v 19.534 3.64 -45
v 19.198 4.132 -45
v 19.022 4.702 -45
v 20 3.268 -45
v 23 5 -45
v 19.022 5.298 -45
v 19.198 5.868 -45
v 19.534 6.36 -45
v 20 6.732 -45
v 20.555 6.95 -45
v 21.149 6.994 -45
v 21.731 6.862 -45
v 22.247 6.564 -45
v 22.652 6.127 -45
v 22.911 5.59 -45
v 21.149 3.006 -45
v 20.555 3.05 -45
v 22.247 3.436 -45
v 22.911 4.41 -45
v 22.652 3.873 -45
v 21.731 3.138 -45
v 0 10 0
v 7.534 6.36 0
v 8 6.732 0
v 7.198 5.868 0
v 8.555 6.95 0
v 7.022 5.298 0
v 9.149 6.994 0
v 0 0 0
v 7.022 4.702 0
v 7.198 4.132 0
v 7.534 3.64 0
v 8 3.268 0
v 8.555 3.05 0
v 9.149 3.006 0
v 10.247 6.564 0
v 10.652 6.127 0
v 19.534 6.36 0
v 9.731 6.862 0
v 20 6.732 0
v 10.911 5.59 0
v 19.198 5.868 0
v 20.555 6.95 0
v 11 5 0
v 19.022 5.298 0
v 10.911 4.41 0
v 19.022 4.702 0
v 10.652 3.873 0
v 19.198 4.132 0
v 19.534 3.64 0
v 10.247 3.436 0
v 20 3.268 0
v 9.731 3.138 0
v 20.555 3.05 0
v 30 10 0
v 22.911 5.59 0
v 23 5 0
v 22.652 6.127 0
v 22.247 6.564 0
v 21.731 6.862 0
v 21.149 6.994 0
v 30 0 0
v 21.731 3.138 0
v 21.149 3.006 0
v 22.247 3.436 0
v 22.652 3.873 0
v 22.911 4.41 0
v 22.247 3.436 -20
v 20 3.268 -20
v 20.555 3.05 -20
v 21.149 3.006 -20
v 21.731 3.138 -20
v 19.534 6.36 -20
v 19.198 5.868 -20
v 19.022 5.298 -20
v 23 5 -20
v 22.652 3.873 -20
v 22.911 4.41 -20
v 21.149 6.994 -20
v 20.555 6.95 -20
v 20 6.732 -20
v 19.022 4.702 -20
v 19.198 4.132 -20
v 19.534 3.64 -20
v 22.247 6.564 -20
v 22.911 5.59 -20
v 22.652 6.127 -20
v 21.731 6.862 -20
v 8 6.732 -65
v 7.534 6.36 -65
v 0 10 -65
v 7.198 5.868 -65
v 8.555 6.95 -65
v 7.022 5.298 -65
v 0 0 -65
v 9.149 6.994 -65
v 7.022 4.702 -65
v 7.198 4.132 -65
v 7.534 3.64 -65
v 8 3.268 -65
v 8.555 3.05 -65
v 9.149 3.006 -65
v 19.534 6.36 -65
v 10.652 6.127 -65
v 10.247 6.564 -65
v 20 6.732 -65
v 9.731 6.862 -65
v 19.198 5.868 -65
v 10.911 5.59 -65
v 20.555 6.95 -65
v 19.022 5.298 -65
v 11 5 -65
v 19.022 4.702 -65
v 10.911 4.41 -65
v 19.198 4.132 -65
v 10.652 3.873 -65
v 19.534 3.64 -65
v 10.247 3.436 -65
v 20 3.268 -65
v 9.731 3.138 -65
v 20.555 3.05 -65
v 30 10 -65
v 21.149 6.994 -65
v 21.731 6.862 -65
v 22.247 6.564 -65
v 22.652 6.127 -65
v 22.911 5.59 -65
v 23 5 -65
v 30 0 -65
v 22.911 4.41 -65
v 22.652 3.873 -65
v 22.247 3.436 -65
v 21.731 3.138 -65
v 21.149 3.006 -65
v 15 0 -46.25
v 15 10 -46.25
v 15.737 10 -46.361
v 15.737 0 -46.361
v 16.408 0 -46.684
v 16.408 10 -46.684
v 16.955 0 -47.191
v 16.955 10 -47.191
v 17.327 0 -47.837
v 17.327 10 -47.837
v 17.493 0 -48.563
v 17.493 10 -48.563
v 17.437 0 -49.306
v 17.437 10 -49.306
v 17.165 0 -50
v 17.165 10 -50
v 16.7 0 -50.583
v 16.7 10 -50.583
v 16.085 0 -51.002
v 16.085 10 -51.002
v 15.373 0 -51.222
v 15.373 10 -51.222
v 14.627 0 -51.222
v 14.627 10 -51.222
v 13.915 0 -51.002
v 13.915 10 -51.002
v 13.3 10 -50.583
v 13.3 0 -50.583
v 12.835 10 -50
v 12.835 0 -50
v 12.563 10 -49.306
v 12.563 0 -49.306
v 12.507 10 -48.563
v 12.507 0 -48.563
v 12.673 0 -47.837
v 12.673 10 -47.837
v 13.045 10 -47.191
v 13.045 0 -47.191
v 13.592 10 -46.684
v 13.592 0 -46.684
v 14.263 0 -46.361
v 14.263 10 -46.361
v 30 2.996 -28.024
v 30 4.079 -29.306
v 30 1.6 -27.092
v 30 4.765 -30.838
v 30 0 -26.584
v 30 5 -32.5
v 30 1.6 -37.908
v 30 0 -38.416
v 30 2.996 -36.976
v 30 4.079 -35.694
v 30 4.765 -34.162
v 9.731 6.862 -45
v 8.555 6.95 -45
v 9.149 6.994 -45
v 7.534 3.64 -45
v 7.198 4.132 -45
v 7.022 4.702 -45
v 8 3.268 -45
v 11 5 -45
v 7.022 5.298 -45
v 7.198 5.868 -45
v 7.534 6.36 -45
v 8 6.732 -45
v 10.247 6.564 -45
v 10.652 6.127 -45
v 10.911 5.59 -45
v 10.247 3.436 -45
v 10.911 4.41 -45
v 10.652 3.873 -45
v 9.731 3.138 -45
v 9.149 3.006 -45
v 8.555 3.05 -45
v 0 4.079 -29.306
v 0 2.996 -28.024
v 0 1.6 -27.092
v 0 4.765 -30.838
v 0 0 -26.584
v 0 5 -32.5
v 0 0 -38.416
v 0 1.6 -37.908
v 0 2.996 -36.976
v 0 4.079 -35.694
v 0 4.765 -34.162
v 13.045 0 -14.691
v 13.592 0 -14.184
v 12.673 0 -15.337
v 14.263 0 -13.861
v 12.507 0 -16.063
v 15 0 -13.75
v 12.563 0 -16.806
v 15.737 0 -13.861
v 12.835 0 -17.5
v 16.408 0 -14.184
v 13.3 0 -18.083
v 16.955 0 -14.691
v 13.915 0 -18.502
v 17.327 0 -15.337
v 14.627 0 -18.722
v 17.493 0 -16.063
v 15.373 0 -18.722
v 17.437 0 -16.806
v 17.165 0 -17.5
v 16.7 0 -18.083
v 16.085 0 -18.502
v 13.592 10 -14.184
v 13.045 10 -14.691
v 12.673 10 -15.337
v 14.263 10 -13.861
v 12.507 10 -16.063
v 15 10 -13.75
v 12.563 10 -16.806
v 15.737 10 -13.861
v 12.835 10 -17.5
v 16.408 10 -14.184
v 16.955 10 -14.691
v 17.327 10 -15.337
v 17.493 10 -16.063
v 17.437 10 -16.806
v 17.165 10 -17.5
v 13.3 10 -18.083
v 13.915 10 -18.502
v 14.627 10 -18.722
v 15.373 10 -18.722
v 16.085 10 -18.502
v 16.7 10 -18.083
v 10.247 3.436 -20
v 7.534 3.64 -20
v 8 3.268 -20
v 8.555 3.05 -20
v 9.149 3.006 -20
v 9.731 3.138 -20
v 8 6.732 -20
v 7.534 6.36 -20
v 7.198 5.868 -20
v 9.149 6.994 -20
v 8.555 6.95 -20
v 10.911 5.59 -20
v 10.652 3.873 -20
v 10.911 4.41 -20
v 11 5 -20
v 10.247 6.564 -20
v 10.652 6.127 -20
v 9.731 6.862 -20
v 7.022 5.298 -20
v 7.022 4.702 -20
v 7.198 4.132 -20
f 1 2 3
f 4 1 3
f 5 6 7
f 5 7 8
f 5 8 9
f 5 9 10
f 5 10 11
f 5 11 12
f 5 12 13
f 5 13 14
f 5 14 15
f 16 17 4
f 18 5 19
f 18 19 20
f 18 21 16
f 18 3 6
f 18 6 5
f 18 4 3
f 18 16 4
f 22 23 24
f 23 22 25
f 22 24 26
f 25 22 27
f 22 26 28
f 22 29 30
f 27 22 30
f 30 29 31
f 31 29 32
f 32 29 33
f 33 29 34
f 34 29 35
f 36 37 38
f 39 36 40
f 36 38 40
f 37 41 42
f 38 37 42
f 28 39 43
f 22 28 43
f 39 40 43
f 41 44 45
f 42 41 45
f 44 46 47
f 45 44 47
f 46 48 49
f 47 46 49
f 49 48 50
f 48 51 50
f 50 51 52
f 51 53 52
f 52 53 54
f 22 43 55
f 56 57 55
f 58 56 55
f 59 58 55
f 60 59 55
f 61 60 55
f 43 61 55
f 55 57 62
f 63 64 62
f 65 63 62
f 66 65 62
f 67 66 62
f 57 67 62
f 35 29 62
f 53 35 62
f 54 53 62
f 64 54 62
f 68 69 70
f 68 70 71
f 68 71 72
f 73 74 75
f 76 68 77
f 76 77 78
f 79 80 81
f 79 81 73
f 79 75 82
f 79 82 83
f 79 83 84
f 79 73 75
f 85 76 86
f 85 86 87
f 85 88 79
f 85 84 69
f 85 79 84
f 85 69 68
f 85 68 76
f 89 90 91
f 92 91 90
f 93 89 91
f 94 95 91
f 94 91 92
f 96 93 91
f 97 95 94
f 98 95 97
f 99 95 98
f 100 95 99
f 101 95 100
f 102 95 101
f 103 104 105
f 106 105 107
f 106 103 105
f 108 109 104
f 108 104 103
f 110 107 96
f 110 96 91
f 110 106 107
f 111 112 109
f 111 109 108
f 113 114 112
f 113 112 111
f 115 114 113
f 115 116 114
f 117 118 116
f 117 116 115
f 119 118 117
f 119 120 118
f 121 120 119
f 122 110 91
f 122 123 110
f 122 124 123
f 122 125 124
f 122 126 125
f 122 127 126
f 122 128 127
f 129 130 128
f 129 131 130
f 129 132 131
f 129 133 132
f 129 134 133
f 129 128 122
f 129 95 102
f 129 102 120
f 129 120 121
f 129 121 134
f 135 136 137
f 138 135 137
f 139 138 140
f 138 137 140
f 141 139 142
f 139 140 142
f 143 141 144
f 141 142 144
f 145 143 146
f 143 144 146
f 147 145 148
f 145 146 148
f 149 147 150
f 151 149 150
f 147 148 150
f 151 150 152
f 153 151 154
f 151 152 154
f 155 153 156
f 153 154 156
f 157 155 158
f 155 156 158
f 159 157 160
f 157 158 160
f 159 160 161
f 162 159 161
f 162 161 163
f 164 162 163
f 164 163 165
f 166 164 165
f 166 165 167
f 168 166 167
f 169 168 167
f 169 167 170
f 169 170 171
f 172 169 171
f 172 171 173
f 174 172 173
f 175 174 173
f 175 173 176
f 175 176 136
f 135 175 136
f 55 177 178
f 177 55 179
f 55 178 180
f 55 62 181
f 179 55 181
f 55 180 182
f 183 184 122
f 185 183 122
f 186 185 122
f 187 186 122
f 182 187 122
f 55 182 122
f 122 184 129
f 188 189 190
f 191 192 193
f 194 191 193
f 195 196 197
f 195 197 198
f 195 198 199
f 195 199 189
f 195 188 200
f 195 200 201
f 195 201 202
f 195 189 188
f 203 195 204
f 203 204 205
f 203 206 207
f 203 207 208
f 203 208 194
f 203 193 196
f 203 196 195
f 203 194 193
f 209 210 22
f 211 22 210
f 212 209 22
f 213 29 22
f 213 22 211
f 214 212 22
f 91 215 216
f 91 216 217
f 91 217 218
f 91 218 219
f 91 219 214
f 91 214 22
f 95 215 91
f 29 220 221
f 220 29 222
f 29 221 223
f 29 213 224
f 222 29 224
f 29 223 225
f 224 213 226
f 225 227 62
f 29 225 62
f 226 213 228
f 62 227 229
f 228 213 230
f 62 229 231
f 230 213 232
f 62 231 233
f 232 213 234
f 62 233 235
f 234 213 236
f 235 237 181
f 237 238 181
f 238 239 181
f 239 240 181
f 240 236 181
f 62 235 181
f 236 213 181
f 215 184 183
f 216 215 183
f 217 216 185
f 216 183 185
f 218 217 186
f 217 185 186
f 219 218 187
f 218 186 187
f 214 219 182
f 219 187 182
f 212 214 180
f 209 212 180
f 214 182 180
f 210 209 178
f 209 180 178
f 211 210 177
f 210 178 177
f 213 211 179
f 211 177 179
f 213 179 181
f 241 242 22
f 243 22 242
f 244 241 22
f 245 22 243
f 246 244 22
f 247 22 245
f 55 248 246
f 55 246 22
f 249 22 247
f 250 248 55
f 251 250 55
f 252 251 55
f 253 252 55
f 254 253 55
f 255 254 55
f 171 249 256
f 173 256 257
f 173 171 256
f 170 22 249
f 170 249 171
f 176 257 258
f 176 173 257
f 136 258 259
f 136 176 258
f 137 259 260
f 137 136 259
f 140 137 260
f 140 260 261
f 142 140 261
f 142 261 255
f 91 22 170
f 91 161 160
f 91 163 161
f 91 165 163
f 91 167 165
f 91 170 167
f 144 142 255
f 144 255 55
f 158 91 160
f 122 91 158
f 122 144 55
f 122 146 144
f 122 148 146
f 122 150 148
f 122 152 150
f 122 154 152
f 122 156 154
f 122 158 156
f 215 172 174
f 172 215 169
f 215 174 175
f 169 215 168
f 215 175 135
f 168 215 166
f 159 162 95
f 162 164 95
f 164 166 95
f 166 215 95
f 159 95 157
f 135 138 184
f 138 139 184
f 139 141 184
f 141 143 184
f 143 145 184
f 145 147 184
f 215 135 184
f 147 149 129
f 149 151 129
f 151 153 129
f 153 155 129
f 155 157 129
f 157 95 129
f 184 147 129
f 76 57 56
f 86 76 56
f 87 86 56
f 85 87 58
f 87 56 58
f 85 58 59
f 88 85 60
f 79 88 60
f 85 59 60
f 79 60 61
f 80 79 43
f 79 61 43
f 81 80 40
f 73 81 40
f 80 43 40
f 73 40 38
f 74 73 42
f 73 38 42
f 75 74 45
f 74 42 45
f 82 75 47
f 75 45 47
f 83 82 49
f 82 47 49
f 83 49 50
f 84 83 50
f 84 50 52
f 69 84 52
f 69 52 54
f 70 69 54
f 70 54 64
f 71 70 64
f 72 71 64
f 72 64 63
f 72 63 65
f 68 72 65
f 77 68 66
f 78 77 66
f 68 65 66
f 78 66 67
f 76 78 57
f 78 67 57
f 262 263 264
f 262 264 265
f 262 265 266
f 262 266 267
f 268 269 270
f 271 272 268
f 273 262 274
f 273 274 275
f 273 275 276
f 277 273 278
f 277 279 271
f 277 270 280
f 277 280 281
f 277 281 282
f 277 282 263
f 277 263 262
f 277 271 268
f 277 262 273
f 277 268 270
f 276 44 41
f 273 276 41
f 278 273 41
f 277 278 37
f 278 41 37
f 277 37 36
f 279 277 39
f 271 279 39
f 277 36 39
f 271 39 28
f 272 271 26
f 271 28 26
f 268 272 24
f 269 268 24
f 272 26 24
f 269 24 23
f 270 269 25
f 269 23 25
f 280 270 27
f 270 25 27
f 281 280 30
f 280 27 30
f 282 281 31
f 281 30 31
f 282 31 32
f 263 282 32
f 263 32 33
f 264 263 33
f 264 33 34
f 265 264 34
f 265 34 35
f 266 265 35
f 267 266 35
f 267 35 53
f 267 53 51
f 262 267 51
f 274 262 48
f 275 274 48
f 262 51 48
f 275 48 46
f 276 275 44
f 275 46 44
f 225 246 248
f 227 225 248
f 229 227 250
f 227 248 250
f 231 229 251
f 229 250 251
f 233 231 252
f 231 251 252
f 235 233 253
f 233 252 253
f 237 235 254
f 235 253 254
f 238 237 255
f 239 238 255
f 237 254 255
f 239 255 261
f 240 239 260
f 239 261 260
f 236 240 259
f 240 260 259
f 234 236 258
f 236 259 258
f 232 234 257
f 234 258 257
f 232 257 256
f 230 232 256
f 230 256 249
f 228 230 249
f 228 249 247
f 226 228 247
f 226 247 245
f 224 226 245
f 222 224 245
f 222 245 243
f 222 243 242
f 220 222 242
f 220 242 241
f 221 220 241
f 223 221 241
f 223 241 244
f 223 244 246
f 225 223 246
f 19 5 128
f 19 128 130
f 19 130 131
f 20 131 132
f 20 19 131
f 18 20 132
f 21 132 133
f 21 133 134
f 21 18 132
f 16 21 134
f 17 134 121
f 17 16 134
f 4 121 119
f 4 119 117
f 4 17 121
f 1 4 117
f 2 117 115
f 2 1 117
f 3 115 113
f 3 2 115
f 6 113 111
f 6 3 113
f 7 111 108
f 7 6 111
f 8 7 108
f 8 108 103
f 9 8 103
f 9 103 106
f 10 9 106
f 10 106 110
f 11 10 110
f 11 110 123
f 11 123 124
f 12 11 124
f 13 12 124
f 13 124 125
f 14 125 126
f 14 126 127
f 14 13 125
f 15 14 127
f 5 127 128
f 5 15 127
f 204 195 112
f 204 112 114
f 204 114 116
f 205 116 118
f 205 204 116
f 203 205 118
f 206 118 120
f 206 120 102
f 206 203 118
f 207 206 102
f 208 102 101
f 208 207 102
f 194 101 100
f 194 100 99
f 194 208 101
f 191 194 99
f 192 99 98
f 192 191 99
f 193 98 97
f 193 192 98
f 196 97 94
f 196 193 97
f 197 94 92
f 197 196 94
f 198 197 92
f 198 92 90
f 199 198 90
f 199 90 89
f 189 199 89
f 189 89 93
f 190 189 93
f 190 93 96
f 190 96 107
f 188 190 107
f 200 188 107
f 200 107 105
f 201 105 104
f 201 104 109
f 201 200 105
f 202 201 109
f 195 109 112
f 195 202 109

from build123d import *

# Parameters (mm, degrees)
SKETCH_1_W            = 30
SKETCH_1_H            = 65
EXTRUDE_1_DEPTH       = 10
SKETCH_2_R            = 6
CUT_EXTRUDE_2_DEPTH   = 73.284161474
SKETCH_3_R            = 2.5
CUT_EXTRUDE_3_DEPTH   = 73.284161474
SKETCH_4_R            = 2
CUT_EXTRUDE_1_DEPTH   = 20
CUT_EXTRUDE_START     = -20
SKETCH_5_R            = 2
CUT_EXTRUDE_2_2_DEPTH = 20


with BuildPart() as part:
    # Эскиз1 → Вытянуть1 (new body)
    with BuildSketch(Plane(origin=(0, 0, 0), x_dir=(1, 0, 0), z_dir=(0, 1, 0))):
        with Locations((15, 32.5)):
            Rectangle(SKETCH_1_W, SKETCH_1_H)
    extrude(amount=EXTRUDE_1_DEPTH)

    # Эскиз2 → Cut-Extrude 2 (cut, through all)
    with BuildSketch(Plane(origin=(30, 0, 0), x_dir=(0, 0, -1), z_dir=(1, 0, 0))):
        with Locations((32.5, -1)):
            Circle(SKETCH_2_R)
    extrude(amount=-CUT_EXTRUDE_2_DEPTH, mode=Mode.SUBTRACT)

    # Эскиз3 → Вытянуть3 (cut, through all)
    with BuildSketch(Plane(origin=(0, 10, 0), x_dir=(1, 0, 0), z_dir=(0, 1, 0))):
        with Locations(Location((15, 48.75, 0), (0, 0, 270))):
            Circle(SKETCH_3_R)
        with Locations(Location((15, 16.25, 0), (0, 0, 270))):
            Circle(SKETCH_3_R)
    extrude(amount=-CUT_EXTRUDE_3_DEPTH, mode=Mode.SUBTRACT)

    # Эскиз4 → Вырез-Вытянуть1 (cut)
    with BuildSketch(Plane.XY):
        with Locations((9, 5.000000757)):
            Circle(SKETCH_4_R)
        with Locations((21, 5.000000757)):
            Circle(SKETCH_4_R)
    extrude(amount=-CUT_EXTRUDE_1_DEPTH, mode=Mode.SUBTRACT)

    # Эскиз5 → Cut-Extrude 2 2 (cut)
    with BuildSketch(Plane(origin=(0, 0, -65), x_dir=(-1, 0, 0), z_dir=(0, 0, -1)).offset(CUT_EXTRUDE_START)):
        with Locations(Location((-20.999999999, 5.000000369, 0), (0, 0, 179.99998886))):
            Circle(SKETCH_5_R)
        with Locations(Location((-8.999999999, 5.000000369, 0), (0, 0, 179.99998886))):
            Circle(SKETCH_5_R)
    extrude(amount=CUT_EXTRUDE_2_2_DEPTH, mode=Mode.SUBTRACT)


solid = part.part
